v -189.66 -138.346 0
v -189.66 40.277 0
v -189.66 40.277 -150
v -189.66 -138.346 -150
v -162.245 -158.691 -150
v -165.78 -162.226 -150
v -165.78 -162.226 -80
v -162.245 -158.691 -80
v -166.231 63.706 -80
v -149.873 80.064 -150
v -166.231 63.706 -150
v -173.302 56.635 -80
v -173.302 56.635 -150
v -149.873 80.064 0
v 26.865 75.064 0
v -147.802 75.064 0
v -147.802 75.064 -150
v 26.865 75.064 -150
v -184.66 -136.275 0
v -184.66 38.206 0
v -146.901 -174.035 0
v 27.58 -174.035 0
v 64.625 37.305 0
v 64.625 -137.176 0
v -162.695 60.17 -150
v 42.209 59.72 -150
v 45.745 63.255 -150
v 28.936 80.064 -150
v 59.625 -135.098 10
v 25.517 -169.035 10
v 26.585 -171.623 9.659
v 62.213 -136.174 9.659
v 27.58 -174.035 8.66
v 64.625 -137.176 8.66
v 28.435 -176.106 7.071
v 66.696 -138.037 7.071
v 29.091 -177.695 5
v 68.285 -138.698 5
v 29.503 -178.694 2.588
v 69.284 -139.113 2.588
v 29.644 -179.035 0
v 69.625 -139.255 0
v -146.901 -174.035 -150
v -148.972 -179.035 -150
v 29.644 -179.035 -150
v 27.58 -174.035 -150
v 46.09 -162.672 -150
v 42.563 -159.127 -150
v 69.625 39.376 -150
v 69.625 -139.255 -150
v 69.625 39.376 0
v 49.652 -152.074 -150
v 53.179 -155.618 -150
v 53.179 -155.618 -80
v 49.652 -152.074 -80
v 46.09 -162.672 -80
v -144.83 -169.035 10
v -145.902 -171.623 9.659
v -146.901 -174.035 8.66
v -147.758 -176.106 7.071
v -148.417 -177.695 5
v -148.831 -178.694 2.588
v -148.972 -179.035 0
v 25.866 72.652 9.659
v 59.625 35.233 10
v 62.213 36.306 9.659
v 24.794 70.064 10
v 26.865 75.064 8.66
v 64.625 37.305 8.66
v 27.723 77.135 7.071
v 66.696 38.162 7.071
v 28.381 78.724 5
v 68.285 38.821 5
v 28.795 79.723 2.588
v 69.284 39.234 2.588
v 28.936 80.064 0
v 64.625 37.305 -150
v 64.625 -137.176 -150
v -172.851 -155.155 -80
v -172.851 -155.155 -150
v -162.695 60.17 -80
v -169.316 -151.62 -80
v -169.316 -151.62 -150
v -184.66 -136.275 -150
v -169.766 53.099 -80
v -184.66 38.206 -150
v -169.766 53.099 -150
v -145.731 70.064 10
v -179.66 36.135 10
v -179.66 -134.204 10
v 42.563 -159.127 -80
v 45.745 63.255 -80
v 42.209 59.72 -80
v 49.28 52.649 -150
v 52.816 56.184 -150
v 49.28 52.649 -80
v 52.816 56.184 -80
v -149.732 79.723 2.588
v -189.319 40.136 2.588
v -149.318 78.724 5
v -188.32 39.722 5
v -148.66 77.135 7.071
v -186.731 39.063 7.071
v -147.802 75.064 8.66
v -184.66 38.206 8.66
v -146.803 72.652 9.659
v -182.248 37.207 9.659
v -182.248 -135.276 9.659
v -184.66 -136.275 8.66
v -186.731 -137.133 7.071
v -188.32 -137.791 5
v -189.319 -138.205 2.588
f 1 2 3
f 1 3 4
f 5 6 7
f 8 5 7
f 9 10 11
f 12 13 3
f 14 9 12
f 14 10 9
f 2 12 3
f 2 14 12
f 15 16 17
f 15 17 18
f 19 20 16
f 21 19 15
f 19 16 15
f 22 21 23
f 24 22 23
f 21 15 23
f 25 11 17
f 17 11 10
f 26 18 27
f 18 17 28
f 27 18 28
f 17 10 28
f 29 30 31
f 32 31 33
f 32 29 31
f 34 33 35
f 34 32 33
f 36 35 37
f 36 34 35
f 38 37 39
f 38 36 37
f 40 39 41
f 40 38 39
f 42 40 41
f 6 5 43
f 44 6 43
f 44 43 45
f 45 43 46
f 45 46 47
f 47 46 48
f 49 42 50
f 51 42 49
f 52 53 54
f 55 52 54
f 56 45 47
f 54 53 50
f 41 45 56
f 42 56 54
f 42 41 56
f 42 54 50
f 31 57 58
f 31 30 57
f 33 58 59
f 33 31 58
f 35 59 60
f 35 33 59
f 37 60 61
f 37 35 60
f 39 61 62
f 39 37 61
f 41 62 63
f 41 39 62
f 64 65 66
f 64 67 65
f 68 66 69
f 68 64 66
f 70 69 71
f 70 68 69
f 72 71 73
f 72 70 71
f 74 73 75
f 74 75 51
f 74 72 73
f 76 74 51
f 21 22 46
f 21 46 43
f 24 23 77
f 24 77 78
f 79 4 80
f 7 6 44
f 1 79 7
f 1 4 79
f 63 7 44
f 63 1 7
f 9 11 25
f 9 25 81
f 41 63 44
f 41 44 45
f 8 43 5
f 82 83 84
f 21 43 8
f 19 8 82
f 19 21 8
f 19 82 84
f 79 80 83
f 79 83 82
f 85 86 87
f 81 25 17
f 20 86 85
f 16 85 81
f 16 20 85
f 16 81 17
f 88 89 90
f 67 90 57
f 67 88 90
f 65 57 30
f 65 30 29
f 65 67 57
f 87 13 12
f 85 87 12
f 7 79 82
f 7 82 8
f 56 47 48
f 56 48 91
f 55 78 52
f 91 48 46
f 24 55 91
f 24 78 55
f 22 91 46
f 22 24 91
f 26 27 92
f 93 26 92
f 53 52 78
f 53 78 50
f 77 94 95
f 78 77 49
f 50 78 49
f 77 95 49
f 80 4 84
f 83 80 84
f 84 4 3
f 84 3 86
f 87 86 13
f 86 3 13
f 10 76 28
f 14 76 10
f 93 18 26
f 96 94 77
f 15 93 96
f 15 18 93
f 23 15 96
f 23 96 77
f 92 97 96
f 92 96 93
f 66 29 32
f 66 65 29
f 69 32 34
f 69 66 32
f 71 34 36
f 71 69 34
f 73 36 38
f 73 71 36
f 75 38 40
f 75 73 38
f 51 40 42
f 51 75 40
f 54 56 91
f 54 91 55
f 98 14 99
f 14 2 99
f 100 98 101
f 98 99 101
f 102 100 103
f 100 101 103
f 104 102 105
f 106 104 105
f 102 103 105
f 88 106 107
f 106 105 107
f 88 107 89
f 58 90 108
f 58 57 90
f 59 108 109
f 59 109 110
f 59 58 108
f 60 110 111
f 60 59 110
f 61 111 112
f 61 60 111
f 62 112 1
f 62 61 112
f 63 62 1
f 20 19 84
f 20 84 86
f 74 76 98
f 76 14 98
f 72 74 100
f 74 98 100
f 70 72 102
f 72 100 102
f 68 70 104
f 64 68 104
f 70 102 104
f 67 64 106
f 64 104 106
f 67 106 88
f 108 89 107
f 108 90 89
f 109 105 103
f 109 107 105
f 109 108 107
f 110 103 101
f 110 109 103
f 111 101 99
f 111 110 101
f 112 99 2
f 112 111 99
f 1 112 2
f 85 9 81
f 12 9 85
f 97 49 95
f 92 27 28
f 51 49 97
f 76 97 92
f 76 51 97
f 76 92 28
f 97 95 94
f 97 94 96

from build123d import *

# Parameters (mm, degrees)
F1_DEPTH  = 10
F2_DEPTH  = 150
F3_W      = 10
F3_H      = 70
F4_DEPTH  = 25
F5_R      = 10
F8_W      = 10
F8_H      = 70
F9_DEPTH  = 25
F7_W      = 10
F7_H      = 70
F10_DEPTH = 25
F6_W      = 10
F6_H      = 70
F11_DEPTH = 25


with BuildPart() as f1:
    # F0 (on Top) → F1 (new body)
    with BuildSketch(Plane.XY):
        Polygon((28.9362690725, 80.0640511845), (-149.8727713071, 80.0640511845), (-189.6601299418, 40.2766925498), (-189.6601299418, -138.3464388432), (-148.9716956383, -179.0348731467), (29.644071613, -179.0348731467), (69.624703376, -139.2548863311), (69.624703376, 39.375616881), align=None)
        Polygon((-184.6601299418, 38.205624738), (-147.8017034952, 75.0640511845), (26.8652012606, 75.0640511845), (64.624703376, 37.3045490692), (64.624703376, -137.1764467001), (27.5803679428, -174.0348731467), (-146.9006278264, -174.0348731467), (-184.6601299418, -136.2753710313), align=None, mode=Mode.SUBTRACT)
        Polygon((26.8652012606, 75.0640511845), (-147.8017034952, 75.0640511845), (-184.6601299418, 38.205624738), (-184.6601299418, -136.2753710313), (-146.9006278264, -174.0348731467), (27.5803679428, -174.0348731467), (64.624703376, -137.1764467001), (64.624703376, 37.3045490692), align=None)
    extrude(amount=F1_DEPTH)

    # F0 (on Top) → F2 (join)
    with BuildSketch(Plane.XY):
        Polygon((28.9362690725, 80.0640511845), (-149.8727713071, 80.0640511845), (-189.6601299418, 40.2766925498), (-189.6601299418, -138.3464388432), (-148.9716956383, -179.0348731467), (29.644071613, -179.0348731467), (69.624703376, -139.2548863311), (69.624703376, 39.375616881), align=None)
        Polygon((-184.6601299418, 38.205624738), (-147.8017034952, 75.0640511845), (26.8652012606, 75.0640511845), (64.624703376, 37.3045490692), (64.624703376, -137.1764467001), (27.5803679428, -174.0348731467), (-146.9006278264, -174.0348731467), (-184.6601299418, -136.2753710313), align=None, mode=Mode.SUBTRACT)
    extrude(amount=-F2_DEPTH)

    # F3 (on face) → F4 (cut)
    with BuildSketch(Plane(origin=(-164.0032843925, -164.0032843925, 0), x_dir=(0.7071067812, -0.7071067812, 0), z_dir=(-0.7071067812, -0.7071067812, 0))):
        with Locations((-7.5131911317, -115)):
            Rectangle(F3_W, F3_H)
    extrude(amount=-F4_DEPTH, mode=Mode.SUBTRACT)

    # F5
    f5_edges = [f1.edges().sort_by_distance(p)[0] for p in [
        (-60.468251, 80.064051, 10),
        (-169.766451, 60.170372, 10),
        (-189.66013, -49.034873, 10),
        (-169.315913, -158.690656, 10),
        (-59.663812, -179.034873, 10),
        (49.634387, -159.14488, 10),
        (69.624703, -49.939635, 10),
        (49.280486, 59.719834, 10),
    ]]
    fillet(f5_edges, radius=F5_R)

    # F8 (on face) → F9 (cut)
    with BuildSketch(Plane(origin=(-114.9684112458, 114.9684112458, 0), x_dir=(-0.7071067812, -0.7071067812, 0), z_dir=(-0.7071067812, 0.7071067812, 0))):
        with Locations((77.4961304807, -115)):
            Rectangle(F8_W, F8_H)
    extrude(amount=-F9_DEPTH, mode=Mode.SUBTRACT)

    # F7 (on face) → F10 (cut)
    with BuildSketch(Plane(origin=(54.5001601285, 54.5001601285, 0), x_dir=(-0.7071067812, 0.7071067812, 0), z_dir=(0.7071067812, 0.7071067812, 0))):
        with Locations((7.3817336266, -115)):
            Rectangle(F7_W, F7_H)
    extrude(amount=-F10_DEPTH, mode=Mode.SUBTRACT)

    # F6 (on face) → F11 (cut)
    with BuildSketch(Plane(origin=(104.2637675873, -104.7896601235, 0), x_dir=(0.7088833284, 0.7053257593, 0), z_dir=(0.7053257593, -0.7088833284, 0))):
        with Locations((-77.0639933351, -115)):
            Rectangle(F6_W, F6_H)
    extrude(amount=-F11_DEPTH, mode=Mode.SUBTRACT)


solid = f1.part
